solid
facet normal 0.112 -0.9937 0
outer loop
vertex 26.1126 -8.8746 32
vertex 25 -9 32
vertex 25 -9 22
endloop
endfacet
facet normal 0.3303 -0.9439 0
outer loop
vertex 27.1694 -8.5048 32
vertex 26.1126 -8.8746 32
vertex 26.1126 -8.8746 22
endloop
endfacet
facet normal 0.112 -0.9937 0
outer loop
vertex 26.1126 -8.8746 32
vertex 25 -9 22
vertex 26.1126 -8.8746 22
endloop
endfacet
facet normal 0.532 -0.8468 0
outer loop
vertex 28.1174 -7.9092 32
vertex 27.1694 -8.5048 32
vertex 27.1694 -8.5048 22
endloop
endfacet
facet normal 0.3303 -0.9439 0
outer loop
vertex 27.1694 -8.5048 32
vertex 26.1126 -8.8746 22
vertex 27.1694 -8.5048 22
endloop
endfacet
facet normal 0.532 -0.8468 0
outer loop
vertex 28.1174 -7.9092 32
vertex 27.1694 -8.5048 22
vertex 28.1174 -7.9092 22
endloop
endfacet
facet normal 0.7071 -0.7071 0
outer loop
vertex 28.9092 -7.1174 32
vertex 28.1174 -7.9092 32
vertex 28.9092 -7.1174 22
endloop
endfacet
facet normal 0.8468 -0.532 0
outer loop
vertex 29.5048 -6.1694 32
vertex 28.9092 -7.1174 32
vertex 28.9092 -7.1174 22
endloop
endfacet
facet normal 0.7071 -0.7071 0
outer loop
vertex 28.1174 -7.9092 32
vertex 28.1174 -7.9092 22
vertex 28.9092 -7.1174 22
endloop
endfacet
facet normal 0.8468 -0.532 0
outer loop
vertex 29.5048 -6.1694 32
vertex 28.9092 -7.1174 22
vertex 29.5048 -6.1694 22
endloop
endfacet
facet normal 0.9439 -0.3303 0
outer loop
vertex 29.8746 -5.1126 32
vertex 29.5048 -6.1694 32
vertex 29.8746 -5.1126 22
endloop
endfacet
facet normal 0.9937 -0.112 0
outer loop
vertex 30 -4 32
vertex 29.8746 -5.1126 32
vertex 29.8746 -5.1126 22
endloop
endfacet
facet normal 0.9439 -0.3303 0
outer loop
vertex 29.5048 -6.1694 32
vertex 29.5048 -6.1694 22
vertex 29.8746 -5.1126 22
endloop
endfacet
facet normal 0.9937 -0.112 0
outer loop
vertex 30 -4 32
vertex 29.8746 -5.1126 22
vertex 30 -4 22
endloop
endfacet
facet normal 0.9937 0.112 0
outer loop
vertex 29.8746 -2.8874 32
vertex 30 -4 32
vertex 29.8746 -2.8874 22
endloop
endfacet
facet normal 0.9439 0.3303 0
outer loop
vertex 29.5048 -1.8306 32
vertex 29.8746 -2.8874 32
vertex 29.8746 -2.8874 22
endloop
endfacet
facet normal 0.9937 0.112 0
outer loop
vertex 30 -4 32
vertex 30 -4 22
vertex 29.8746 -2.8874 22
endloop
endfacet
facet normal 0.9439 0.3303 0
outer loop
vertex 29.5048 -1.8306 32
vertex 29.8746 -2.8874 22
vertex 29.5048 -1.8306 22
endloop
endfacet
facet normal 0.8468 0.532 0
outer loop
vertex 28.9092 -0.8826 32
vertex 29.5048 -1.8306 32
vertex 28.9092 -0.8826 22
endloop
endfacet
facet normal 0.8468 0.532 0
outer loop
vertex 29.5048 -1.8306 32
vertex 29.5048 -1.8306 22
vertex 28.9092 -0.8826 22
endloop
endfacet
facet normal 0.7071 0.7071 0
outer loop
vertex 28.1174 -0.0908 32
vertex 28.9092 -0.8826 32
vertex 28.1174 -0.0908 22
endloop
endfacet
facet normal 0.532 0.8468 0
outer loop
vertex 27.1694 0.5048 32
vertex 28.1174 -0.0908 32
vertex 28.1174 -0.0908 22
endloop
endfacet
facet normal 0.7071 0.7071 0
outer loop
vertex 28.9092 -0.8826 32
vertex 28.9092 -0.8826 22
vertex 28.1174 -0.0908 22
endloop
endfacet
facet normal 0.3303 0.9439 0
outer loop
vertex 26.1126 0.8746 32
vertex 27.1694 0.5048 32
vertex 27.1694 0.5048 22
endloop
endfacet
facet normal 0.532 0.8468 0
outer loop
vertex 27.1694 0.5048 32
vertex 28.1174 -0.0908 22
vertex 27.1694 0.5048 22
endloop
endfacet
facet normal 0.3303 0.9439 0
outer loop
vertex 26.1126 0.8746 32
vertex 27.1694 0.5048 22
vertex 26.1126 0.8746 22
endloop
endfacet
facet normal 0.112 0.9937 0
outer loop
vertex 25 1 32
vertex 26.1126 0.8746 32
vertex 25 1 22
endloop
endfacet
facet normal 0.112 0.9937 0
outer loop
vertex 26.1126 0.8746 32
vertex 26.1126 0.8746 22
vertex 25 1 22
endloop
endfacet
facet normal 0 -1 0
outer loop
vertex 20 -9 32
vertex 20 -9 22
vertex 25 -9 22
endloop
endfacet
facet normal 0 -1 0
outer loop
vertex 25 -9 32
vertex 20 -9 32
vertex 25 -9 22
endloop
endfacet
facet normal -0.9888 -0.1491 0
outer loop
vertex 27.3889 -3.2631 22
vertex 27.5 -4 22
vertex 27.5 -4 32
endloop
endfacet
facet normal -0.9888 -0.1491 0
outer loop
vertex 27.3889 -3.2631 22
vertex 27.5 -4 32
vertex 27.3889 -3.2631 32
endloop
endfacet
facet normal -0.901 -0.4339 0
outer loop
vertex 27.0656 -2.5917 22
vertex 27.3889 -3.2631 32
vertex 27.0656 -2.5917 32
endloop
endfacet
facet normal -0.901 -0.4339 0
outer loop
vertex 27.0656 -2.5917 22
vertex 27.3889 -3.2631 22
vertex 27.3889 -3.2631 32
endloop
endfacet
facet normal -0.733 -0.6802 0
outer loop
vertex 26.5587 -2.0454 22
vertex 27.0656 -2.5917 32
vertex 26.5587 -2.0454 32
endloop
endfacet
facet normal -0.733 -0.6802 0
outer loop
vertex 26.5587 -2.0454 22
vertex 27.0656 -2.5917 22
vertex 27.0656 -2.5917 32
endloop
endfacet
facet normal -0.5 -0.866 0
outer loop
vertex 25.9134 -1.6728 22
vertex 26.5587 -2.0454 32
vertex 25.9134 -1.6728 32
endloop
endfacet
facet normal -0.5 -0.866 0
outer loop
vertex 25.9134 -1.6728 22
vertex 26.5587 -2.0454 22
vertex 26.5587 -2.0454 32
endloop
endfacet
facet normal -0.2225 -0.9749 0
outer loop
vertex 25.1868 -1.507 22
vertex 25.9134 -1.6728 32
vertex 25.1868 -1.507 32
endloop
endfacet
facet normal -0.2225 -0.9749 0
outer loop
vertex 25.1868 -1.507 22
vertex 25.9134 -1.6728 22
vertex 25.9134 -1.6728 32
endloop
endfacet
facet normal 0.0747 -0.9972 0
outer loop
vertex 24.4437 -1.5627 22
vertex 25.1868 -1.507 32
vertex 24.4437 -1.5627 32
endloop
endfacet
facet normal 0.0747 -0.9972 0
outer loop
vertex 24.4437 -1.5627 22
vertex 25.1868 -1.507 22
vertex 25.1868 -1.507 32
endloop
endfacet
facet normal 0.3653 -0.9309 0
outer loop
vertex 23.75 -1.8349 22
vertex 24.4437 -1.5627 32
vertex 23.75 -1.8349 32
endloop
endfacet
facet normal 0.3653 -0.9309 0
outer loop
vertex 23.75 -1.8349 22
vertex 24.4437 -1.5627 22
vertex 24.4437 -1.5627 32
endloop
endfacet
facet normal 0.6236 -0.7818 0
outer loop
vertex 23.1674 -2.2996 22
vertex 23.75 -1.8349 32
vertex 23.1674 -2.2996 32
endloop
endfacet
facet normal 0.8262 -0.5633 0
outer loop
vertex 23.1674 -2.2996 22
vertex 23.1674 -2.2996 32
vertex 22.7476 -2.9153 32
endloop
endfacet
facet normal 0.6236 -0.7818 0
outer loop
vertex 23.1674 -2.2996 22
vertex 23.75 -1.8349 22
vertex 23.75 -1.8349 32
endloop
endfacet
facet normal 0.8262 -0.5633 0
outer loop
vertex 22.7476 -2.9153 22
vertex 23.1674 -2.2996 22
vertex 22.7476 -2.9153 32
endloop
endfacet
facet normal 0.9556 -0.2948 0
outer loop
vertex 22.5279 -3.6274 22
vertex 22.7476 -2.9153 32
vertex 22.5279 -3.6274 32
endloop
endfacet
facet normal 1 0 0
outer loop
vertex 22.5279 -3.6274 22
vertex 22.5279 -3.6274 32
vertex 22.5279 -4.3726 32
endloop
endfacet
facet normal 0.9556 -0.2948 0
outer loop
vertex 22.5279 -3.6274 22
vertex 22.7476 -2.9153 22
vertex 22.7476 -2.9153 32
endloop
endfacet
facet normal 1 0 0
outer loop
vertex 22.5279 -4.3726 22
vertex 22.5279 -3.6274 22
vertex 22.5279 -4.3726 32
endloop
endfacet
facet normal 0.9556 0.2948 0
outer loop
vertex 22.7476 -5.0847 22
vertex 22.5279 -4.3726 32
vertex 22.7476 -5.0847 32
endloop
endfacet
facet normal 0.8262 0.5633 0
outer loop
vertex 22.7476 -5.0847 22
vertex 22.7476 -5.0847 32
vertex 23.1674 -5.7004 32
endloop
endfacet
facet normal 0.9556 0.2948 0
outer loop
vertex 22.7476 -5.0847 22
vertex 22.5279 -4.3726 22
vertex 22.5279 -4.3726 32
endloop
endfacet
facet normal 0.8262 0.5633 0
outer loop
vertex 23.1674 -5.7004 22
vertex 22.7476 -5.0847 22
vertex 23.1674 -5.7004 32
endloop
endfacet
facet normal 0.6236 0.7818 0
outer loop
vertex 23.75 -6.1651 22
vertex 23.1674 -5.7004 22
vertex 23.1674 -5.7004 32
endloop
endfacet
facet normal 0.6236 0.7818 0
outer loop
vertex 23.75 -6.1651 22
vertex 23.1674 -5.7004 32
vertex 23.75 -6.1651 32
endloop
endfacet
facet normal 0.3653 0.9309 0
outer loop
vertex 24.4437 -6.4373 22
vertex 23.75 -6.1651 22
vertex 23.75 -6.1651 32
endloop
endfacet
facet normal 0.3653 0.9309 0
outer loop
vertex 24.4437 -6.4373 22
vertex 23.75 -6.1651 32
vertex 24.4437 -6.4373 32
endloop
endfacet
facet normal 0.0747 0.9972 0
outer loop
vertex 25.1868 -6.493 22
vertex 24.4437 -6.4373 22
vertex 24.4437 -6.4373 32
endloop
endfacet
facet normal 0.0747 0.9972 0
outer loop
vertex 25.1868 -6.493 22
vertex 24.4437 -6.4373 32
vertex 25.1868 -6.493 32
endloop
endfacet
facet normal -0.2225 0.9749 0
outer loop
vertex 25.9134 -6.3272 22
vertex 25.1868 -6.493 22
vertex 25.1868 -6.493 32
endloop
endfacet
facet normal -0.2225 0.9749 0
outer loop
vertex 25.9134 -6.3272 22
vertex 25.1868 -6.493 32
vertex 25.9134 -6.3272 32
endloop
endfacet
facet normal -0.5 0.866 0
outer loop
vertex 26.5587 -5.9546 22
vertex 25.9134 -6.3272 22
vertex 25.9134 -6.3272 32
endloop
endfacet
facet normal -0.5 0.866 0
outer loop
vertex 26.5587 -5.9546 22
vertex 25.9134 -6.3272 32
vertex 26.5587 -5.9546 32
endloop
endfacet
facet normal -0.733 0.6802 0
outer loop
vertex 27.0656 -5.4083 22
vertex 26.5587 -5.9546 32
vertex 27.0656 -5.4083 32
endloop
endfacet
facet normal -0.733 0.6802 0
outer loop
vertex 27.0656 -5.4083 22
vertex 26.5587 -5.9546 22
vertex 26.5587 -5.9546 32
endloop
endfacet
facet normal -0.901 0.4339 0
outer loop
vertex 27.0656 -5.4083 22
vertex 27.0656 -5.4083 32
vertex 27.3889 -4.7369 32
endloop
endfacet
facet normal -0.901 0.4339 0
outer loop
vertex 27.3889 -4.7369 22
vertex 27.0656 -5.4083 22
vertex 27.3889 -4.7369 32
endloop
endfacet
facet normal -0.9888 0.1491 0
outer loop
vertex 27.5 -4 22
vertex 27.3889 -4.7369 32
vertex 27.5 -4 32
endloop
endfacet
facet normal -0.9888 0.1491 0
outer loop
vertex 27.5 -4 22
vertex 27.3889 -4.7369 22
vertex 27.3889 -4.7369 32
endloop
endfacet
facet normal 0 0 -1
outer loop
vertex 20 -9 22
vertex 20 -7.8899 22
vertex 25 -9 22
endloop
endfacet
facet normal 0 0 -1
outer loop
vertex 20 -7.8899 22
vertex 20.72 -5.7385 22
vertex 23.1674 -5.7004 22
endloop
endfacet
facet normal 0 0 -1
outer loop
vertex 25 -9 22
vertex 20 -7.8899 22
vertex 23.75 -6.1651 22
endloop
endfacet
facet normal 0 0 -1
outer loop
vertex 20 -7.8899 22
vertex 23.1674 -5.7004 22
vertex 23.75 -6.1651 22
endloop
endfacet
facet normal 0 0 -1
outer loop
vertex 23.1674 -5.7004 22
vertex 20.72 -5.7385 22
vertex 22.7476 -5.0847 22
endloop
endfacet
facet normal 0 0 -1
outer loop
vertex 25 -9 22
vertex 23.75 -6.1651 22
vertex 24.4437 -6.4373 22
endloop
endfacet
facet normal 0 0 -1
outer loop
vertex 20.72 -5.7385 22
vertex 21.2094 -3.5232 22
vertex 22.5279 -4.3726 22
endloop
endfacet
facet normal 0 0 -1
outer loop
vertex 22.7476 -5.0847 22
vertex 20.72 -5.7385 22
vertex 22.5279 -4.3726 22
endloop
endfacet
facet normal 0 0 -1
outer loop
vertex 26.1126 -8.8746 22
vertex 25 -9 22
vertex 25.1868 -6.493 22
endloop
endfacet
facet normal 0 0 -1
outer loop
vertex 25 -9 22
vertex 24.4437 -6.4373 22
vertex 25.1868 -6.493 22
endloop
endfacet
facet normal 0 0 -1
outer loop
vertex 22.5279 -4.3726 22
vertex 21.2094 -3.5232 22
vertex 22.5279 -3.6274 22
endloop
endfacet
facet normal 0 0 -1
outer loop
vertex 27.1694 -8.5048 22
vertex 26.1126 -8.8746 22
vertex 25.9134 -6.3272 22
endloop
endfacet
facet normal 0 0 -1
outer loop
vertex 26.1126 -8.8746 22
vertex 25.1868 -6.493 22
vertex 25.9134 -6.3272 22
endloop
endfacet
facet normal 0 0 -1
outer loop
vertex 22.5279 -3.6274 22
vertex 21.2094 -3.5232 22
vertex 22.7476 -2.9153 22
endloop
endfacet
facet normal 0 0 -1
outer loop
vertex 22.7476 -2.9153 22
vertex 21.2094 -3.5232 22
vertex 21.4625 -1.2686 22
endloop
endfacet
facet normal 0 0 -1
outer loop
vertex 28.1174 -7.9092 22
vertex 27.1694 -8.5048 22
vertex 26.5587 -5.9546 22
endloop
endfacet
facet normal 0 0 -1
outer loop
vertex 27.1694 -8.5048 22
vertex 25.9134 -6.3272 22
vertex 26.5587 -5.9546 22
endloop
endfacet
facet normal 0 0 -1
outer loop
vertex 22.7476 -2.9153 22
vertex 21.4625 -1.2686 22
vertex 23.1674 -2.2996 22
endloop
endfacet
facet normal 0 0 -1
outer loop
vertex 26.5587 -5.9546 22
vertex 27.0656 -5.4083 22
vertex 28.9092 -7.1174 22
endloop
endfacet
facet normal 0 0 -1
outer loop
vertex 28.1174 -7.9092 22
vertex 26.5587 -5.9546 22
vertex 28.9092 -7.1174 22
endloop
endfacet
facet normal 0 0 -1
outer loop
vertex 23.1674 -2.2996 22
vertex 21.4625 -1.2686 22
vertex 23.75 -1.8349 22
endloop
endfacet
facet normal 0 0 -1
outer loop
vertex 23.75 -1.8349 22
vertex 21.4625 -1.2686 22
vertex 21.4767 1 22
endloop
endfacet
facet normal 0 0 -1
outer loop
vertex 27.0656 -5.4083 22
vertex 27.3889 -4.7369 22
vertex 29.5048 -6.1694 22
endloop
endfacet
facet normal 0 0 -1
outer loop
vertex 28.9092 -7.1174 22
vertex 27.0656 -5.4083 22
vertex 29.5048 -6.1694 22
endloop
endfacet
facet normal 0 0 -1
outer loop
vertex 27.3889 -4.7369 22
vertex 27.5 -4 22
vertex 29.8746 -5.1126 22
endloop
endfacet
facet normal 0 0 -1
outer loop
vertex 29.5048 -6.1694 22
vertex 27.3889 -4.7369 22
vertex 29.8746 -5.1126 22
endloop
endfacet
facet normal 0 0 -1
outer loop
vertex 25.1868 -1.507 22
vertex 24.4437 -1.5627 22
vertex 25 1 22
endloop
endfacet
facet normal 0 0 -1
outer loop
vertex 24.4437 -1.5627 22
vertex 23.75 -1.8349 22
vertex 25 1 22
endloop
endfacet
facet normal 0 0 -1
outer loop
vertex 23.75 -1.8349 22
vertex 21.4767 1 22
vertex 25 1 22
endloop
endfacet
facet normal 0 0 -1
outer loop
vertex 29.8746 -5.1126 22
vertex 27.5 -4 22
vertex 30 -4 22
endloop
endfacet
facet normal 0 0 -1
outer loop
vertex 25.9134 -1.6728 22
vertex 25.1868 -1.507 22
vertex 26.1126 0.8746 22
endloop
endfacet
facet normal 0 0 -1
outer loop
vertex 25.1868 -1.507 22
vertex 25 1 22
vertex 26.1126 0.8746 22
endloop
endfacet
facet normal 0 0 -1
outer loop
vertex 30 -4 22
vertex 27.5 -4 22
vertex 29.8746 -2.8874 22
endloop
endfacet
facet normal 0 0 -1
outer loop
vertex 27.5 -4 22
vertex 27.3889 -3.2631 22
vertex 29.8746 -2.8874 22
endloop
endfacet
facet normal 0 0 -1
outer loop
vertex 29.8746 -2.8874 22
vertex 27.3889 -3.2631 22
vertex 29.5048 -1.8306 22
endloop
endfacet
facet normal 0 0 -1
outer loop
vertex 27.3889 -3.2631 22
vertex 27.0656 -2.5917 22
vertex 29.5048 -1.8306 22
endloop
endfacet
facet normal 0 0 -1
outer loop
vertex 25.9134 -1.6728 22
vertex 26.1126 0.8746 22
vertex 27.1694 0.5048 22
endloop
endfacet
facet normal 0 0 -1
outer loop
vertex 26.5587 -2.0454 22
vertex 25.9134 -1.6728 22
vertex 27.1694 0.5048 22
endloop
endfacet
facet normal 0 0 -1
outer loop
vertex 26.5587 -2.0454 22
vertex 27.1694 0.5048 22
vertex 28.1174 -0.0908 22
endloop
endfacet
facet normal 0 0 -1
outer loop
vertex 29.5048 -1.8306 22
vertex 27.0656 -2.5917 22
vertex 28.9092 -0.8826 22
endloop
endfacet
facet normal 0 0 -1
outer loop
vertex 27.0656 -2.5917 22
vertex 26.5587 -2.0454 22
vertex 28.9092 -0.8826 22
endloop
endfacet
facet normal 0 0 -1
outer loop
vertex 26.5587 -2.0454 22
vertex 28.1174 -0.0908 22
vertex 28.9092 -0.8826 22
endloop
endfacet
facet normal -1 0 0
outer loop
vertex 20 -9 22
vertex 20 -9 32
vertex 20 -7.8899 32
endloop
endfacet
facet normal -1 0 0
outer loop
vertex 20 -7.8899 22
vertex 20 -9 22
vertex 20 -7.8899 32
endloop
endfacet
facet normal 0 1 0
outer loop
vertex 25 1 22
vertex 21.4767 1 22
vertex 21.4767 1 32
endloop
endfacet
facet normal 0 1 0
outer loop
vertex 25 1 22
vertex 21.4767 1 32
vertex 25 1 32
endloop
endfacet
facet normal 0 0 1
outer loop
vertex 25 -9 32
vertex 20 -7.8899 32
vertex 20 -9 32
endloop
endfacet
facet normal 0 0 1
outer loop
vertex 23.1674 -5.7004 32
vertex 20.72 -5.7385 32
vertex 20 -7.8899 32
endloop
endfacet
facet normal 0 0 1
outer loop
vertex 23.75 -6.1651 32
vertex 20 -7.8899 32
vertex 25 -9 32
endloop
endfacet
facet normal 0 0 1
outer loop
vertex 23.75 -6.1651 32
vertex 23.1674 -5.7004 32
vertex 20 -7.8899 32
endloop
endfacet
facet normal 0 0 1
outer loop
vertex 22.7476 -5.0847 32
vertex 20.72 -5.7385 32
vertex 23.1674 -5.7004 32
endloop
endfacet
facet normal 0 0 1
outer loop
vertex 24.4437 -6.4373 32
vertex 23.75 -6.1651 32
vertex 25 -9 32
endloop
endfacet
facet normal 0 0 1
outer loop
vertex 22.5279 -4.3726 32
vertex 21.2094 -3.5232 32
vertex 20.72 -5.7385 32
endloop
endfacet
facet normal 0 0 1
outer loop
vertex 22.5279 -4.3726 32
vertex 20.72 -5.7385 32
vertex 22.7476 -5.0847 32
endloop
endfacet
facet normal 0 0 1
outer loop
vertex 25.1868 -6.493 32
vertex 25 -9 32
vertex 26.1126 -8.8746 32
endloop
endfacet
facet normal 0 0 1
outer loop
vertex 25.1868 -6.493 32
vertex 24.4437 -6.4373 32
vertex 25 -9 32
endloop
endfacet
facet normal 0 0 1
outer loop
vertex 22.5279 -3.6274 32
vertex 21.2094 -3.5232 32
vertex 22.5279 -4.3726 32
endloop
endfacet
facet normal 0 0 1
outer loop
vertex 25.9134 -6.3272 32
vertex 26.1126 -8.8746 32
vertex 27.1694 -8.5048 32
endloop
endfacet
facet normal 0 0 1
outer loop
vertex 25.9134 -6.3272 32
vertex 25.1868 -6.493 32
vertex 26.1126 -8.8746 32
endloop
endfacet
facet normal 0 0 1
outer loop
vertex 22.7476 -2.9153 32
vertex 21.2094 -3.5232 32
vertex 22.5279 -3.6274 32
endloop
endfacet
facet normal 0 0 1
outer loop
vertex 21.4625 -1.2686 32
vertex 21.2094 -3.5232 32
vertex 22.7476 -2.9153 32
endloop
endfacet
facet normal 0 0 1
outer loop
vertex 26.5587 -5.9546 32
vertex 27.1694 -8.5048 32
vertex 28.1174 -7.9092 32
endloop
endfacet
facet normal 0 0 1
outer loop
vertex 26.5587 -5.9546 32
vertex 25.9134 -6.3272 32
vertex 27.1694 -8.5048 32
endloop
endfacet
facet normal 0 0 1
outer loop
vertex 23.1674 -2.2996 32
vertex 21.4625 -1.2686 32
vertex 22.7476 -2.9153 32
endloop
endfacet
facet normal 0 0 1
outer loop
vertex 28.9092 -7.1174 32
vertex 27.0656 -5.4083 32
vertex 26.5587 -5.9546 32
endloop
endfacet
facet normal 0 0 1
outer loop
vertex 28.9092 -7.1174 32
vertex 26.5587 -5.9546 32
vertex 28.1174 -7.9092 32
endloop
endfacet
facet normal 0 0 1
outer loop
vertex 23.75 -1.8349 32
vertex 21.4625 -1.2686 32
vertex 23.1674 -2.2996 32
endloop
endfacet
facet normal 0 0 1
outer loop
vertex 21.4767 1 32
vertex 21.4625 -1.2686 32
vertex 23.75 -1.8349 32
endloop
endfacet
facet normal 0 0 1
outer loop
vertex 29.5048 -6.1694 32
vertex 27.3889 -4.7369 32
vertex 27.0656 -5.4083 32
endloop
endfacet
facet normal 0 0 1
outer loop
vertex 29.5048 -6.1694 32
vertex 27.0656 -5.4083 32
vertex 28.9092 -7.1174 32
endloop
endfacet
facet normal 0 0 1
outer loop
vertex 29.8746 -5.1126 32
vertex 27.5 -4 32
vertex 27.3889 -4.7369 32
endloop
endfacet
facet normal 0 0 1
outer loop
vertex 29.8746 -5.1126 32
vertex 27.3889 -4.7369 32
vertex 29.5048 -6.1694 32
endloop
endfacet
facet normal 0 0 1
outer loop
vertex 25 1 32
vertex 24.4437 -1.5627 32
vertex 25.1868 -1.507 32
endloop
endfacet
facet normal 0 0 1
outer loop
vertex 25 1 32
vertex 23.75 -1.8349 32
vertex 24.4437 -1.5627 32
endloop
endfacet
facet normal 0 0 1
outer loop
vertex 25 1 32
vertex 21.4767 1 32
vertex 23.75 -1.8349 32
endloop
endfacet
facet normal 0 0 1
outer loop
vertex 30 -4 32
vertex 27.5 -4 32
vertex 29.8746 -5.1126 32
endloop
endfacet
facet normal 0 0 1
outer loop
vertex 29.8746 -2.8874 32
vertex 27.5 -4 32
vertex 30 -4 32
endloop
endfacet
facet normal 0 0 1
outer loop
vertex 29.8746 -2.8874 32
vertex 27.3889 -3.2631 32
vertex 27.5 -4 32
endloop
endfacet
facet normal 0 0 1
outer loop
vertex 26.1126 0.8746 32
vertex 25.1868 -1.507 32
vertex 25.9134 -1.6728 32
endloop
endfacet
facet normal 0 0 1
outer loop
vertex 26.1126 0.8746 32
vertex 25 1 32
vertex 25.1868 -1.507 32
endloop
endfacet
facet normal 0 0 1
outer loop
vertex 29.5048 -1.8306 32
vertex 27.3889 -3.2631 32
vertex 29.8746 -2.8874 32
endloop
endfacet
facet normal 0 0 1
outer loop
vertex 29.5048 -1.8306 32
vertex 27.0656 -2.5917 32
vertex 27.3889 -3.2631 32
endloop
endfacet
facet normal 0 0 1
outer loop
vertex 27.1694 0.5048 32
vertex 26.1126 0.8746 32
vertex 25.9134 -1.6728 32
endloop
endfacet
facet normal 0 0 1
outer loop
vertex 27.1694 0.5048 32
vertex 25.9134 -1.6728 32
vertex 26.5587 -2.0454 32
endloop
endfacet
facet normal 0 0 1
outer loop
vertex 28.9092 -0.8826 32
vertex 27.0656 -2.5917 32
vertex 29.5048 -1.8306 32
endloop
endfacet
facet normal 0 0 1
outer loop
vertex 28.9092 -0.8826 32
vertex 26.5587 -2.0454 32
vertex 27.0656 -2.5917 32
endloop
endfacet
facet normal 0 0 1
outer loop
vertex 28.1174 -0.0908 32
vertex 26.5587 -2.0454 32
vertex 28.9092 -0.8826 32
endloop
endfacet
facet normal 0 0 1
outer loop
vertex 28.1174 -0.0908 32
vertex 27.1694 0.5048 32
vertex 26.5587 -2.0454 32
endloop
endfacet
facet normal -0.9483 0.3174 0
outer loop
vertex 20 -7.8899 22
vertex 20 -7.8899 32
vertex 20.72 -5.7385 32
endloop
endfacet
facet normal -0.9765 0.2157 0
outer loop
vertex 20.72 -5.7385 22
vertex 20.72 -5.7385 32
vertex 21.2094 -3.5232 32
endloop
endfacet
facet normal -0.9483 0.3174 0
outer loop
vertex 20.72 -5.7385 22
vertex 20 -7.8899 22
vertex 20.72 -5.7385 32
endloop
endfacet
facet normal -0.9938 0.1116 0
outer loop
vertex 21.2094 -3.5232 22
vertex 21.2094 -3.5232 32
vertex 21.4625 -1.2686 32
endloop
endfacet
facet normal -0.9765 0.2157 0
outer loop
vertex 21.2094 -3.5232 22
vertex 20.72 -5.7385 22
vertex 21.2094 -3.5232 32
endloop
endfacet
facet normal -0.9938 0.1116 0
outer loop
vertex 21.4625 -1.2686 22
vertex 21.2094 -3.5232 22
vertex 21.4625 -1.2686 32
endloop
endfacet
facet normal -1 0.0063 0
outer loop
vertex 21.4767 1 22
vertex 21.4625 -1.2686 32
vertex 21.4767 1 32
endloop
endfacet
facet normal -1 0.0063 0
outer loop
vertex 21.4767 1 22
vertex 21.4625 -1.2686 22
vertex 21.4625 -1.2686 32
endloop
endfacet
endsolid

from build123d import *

# Parameters (mm, degrees)
CYLINDER416_R     = 2.5
CYLINDER416_DEPTH = 10
CYLINDER418_R     = 21.5
CYLINDER418_DEPTH = 63
BOX001_W          = 5
BOX001_H          = 10
BOX001_DEPTH      = 10
CYLINDER417_R     = 5
CYLINDER417_DEPTH = 10


with BuildPart() as cylinder416:
    # Cylinder416 → Cylinder416 (new body)
    with BuildSketch(Plane(origin=(25, -4, 0), x_dir=(1, 0, 0), z_dir=(0, 0, 1))):
        Circle(CYLINDER416_R)
    extrude(amount=CYLINDER416_DEPTH)


with BuildPart() as fusion093:
    # Cylinder418 → Cylinder418 (new body)
    with BuildSketch(Plane.XY):
        Circle(CYLINDER418_R)
    extrude(amount=CYLINDER418_DEPTH)

    # Fusion093: union Cylinder416
    add(cylinder416.part)


with BuildPart() as cube001:
    # Box001 → Box001 (new body)
    with BuildSketch(Plane(origin=(20, -9, 0), x_dir=(1, 0, 0), z_dir=(0, 0, 1))):
        with Locations((2.5, 5)):
            Rectangle(BOX001_W, BOX001_H)
    extrude(amount=BOX001_DEPTH)


with BuildPart() as slider:
    # Cylinder417 → Cylinder417 (new body)
    with BuildSketch(Plane(origin=(25, -4, 0), x_dir=(1, 0, 0), z_dir=(0, 0, 1))):
        Circle(CYLINDER417_R)
    extrude(amount=CYLINDER417_DEPTH)

    # Fusion092: union Cube001
    add(cube001.part)

    # Cut236: cut Fusion093
    add(fusion093.part, mode=Mode.SUBTRACT)


with BuildPart() as slider_1:
    # Cut236 placement: moved
    add(slider.part.moved(Location((0, 0, 22))))


solid = slider_1.part
